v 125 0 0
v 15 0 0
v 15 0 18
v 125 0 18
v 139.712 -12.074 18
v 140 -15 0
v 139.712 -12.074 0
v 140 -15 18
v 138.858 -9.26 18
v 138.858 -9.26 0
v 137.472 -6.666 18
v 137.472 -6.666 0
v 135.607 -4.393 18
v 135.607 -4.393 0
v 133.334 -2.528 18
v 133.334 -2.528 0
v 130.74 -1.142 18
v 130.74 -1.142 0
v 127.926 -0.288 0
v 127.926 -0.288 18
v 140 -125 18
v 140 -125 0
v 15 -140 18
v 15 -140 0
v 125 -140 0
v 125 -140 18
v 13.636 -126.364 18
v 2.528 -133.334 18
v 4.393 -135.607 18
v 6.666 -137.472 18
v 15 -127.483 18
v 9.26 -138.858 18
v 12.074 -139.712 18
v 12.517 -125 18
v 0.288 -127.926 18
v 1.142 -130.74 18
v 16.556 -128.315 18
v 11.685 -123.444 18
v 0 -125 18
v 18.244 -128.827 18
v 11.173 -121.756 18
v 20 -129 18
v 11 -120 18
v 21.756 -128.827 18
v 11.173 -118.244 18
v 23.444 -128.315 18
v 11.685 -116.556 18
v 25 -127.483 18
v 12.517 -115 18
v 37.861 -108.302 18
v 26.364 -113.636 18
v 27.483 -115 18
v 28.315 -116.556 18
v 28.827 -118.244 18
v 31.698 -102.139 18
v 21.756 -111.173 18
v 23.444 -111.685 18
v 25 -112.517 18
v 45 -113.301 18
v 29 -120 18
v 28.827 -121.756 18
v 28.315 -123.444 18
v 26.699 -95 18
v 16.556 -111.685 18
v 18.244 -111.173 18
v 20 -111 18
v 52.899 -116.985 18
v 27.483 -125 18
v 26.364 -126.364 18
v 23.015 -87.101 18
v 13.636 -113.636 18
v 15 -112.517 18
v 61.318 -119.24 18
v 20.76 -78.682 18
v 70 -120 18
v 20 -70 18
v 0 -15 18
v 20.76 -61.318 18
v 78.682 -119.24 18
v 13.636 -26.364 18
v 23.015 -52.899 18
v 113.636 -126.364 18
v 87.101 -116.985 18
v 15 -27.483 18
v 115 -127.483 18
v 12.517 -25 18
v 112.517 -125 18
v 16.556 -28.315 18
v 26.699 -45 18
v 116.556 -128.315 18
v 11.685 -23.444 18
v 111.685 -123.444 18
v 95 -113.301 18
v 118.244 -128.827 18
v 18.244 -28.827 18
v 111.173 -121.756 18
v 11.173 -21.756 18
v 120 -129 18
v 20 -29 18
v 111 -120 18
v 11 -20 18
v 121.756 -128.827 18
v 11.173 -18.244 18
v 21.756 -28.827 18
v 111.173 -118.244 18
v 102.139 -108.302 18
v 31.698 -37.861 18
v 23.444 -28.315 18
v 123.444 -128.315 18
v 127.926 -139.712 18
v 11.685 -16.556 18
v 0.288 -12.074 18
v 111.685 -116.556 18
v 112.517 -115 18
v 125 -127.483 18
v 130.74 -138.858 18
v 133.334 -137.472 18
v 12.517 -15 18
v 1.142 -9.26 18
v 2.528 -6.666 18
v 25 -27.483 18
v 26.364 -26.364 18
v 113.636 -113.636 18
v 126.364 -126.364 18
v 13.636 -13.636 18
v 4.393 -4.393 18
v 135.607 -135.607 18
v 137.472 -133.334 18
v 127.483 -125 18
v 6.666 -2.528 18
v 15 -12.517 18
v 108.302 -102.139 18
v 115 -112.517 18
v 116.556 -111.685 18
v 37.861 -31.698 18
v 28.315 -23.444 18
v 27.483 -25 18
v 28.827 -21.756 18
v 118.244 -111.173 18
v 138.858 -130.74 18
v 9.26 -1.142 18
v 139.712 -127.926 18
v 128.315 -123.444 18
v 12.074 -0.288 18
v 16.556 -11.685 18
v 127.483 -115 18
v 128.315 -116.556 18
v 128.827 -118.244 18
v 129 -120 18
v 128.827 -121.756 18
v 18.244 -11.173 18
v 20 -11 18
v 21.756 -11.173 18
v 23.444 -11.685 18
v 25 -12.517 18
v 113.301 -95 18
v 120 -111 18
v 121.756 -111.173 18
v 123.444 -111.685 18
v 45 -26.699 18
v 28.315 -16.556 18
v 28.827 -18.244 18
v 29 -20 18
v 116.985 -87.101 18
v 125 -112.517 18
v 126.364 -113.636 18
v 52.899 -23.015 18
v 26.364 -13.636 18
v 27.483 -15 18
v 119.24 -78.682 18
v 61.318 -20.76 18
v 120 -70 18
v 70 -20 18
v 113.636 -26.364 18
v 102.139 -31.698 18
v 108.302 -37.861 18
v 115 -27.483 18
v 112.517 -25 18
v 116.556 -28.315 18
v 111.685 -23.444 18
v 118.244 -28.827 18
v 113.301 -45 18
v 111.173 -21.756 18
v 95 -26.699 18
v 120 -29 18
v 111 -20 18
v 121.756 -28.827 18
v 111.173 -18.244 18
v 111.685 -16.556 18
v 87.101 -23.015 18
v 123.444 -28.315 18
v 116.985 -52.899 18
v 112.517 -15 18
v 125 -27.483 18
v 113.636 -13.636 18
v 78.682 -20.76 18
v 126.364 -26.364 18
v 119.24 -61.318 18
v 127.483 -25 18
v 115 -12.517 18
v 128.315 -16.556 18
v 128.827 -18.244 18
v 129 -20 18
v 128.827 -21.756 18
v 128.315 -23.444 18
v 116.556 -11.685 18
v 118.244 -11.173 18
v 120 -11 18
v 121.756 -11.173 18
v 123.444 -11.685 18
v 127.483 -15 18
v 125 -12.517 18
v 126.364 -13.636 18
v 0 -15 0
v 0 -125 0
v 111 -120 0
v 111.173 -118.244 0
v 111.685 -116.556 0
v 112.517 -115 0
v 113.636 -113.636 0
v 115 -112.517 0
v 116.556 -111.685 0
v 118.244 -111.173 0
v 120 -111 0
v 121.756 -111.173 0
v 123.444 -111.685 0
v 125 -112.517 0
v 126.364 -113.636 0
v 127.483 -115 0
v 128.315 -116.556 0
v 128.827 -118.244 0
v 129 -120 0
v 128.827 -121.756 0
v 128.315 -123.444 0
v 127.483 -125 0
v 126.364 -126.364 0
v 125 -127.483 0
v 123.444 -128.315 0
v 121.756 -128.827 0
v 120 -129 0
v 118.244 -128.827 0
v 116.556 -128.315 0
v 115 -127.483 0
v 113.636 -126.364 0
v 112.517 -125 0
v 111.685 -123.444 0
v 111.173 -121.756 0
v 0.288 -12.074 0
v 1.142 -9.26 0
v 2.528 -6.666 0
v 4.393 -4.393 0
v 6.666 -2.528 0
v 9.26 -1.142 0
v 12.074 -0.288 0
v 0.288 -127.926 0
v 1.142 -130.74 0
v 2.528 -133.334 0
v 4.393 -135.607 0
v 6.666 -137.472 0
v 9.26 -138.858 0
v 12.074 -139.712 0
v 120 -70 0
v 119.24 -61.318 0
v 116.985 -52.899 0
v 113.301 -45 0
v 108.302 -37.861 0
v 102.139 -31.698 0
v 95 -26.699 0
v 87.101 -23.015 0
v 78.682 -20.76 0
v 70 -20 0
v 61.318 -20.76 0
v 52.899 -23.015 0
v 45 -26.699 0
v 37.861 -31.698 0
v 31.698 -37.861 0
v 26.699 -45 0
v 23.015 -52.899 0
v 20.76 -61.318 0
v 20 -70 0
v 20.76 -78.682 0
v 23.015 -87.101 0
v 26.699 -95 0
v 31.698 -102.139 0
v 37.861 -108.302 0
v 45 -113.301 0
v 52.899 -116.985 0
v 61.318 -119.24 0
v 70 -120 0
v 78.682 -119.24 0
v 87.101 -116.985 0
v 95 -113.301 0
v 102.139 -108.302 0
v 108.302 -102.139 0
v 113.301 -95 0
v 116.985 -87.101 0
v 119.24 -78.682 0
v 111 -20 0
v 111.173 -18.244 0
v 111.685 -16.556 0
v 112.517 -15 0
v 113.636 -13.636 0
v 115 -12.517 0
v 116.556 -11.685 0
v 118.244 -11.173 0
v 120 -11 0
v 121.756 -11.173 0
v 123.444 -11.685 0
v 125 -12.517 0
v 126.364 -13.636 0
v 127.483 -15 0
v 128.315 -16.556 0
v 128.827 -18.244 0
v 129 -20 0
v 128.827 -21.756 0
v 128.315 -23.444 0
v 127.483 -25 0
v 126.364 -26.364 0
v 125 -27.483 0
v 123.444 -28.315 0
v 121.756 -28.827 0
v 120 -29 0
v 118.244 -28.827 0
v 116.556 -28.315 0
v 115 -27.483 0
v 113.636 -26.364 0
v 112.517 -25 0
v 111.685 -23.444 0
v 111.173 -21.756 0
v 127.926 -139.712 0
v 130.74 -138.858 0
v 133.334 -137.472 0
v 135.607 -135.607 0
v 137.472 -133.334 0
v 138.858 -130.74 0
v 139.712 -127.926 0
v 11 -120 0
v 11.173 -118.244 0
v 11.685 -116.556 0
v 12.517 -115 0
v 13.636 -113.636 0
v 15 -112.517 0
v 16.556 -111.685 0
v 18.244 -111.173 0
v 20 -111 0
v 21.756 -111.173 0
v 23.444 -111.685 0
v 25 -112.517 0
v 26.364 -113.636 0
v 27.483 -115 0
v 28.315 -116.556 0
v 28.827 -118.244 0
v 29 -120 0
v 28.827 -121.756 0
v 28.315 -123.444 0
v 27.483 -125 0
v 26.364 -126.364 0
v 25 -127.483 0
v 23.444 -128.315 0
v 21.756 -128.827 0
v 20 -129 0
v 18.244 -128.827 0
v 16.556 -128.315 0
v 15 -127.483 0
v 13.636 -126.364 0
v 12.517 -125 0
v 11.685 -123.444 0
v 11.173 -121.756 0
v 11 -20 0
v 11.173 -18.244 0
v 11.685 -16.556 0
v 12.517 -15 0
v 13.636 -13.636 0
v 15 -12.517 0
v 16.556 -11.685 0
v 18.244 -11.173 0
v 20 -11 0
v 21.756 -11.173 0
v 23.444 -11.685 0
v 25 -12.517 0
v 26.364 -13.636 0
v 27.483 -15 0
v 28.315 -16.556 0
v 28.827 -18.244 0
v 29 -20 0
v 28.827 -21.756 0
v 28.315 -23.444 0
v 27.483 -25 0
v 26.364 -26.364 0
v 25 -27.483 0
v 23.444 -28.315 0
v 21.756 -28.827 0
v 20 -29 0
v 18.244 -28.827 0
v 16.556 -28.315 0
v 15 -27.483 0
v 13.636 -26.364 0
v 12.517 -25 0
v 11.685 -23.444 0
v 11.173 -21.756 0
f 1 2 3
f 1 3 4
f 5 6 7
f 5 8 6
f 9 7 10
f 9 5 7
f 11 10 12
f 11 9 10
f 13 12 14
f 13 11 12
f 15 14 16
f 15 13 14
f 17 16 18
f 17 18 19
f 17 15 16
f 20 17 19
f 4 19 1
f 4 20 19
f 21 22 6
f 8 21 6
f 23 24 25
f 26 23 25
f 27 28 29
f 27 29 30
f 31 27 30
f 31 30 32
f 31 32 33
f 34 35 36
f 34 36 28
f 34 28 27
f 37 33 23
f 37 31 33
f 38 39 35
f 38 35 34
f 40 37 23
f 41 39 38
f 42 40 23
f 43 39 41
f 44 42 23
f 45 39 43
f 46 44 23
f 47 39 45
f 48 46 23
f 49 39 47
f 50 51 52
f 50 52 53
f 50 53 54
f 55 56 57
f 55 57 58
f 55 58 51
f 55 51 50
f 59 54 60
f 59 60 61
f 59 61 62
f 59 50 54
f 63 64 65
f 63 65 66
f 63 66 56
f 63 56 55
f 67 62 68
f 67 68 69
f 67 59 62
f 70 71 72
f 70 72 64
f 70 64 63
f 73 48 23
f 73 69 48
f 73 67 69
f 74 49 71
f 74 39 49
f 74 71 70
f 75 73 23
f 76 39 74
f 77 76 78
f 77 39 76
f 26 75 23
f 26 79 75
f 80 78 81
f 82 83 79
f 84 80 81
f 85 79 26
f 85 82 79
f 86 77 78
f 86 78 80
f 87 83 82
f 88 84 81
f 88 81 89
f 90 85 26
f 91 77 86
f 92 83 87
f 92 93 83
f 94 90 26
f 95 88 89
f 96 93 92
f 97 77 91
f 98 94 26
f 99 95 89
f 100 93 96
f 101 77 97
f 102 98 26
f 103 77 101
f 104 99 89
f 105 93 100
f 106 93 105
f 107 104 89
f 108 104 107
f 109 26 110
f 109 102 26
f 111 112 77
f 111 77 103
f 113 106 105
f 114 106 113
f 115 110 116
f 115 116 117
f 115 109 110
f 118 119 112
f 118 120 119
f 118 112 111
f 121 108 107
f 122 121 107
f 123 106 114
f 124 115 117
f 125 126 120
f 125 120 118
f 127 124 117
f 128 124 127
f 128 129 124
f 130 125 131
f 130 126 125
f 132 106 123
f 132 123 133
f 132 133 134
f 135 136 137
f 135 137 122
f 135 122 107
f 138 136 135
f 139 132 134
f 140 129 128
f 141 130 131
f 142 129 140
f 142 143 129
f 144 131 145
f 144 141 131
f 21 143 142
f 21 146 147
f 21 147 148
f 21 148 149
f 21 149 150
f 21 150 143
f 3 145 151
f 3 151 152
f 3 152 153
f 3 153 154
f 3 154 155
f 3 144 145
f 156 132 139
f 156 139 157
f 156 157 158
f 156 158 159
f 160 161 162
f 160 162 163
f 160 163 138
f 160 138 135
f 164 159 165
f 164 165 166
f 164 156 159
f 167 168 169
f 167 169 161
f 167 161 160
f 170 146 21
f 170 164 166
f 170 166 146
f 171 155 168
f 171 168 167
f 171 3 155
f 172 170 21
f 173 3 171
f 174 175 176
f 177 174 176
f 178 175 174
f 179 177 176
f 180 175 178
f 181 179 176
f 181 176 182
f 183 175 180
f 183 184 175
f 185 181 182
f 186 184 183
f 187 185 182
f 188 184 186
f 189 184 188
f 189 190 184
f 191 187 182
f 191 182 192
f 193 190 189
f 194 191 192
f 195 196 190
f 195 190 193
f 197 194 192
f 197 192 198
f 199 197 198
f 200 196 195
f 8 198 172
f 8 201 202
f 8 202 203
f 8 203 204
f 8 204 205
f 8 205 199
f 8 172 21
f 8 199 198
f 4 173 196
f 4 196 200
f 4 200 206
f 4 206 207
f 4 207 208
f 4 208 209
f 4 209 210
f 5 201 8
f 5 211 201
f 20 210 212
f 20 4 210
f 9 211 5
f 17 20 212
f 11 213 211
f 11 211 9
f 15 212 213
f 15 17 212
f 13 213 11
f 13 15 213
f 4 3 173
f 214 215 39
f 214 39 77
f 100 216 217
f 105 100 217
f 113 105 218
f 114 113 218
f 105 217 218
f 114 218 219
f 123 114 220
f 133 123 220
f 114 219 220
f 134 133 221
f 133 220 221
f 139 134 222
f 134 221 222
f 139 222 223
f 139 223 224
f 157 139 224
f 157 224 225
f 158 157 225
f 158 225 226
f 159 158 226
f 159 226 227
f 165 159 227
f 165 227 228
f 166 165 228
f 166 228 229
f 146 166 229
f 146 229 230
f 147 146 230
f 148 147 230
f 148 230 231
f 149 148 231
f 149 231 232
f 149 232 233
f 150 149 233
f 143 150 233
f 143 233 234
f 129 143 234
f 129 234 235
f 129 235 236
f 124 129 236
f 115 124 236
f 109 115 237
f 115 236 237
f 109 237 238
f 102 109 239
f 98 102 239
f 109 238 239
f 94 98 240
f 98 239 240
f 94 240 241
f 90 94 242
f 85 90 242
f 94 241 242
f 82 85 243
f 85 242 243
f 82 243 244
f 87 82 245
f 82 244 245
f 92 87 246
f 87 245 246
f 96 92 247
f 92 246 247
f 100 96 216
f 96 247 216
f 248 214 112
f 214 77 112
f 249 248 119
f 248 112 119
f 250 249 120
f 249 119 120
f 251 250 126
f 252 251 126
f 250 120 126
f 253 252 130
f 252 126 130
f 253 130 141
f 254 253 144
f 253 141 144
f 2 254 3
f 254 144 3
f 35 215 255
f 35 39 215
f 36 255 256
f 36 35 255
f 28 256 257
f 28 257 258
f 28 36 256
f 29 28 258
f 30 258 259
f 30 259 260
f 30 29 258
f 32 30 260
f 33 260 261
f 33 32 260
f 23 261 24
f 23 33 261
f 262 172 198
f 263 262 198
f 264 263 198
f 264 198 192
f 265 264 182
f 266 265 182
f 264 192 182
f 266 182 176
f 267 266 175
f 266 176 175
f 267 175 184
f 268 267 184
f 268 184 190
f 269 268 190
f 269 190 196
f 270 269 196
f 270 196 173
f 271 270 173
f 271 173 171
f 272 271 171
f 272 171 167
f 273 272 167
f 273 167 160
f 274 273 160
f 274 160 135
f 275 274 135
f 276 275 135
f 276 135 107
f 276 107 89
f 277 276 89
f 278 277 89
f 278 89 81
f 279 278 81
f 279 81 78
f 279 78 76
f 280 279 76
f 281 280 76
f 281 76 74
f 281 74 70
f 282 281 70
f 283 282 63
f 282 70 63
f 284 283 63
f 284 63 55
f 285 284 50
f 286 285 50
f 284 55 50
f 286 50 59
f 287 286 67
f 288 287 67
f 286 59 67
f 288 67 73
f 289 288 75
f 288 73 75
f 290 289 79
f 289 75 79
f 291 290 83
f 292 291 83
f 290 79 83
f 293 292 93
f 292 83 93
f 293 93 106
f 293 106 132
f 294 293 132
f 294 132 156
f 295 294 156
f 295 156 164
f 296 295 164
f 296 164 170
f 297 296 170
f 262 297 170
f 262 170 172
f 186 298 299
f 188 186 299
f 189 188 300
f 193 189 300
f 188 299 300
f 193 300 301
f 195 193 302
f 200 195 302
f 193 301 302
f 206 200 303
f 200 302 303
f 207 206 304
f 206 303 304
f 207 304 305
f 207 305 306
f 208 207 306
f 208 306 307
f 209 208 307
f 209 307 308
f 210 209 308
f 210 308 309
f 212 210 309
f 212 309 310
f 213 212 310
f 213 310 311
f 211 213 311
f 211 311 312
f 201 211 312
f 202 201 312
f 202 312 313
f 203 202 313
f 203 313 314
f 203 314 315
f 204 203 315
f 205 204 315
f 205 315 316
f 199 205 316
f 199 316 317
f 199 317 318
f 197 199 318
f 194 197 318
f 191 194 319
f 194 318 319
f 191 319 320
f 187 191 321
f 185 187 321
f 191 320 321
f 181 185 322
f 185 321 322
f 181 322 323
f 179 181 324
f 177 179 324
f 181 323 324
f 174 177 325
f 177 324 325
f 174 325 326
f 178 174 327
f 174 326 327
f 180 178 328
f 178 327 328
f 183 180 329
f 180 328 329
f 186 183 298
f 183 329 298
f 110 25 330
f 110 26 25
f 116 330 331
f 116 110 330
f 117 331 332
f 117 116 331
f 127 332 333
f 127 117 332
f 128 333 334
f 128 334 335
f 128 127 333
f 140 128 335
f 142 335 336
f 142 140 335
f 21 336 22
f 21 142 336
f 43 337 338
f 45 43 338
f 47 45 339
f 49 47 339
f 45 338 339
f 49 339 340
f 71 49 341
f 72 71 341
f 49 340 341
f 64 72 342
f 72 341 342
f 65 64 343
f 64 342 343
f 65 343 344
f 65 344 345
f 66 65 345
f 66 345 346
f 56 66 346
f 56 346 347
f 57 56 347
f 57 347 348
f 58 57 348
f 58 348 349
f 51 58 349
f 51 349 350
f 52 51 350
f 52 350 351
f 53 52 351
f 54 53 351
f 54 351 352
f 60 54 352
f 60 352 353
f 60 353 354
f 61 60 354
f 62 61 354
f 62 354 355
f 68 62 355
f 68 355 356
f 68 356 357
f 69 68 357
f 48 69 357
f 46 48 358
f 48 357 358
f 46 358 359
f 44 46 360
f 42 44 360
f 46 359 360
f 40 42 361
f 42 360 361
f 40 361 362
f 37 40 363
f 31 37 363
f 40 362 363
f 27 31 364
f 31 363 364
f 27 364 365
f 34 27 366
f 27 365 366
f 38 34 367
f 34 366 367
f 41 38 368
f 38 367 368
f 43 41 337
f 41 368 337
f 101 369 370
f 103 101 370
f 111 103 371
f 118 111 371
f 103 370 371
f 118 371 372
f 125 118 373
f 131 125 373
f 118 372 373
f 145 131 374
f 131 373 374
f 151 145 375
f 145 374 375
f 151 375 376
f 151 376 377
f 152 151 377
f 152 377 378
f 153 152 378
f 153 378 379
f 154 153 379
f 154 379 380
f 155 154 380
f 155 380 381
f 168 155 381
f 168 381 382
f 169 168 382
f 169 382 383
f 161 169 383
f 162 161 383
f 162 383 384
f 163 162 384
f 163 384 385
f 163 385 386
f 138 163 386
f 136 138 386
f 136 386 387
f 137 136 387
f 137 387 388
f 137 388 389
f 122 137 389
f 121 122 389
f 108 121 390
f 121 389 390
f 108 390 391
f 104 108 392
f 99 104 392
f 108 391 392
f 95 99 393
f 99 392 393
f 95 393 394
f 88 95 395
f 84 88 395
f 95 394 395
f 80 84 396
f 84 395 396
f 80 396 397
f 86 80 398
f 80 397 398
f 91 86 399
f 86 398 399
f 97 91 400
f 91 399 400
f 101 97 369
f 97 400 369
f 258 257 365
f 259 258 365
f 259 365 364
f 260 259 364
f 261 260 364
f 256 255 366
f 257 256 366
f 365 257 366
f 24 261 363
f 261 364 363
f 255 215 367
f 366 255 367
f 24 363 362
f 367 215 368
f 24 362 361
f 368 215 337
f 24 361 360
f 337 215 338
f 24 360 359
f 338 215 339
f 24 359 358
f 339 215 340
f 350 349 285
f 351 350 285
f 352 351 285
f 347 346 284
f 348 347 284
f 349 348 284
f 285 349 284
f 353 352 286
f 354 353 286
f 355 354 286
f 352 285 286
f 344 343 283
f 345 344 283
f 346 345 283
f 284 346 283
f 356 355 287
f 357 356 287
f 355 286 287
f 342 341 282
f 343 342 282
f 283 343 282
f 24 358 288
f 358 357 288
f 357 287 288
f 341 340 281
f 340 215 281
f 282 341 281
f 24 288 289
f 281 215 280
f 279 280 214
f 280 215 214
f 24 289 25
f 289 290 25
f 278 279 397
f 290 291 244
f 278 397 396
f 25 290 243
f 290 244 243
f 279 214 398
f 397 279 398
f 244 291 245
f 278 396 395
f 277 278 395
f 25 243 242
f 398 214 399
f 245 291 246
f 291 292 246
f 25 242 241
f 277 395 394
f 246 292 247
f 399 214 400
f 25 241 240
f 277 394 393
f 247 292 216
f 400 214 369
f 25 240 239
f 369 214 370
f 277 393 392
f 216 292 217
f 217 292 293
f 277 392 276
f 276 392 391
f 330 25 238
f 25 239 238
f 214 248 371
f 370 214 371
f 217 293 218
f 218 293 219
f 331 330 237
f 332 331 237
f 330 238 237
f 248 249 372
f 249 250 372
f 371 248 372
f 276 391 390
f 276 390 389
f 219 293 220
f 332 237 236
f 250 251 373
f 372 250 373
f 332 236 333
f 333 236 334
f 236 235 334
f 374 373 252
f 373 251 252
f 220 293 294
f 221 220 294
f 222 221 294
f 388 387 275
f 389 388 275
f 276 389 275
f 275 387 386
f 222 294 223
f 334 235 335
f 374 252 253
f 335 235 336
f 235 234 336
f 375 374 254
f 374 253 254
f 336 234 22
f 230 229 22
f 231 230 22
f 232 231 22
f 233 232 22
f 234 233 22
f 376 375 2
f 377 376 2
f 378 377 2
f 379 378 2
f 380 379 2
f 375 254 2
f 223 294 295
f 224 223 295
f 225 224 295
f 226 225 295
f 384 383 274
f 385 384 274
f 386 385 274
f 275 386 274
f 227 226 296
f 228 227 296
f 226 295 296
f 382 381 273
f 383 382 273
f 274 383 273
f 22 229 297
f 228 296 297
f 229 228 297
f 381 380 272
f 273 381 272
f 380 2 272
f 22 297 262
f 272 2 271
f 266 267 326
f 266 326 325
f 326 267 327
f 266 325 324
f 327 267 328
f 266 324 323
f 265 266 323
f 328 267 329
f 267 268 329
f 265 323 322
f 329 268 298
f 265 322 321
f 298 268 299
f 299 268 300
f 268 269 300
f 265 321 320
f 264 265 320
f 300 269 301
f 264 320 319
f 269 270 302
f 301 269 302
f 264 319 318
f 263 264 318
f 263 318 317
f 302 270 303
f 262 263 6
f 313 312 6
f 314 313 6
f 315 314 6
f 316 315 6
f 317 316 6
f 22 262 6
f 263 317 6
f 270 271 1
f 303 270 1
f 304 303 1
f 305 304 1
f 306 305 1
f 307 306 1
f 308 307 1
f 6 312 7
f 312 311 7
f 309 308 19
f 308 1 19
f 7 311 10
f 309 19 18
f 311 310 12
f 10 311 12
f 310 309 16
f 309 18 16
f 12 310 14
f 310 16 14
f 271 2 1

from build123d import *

# Parameters (mm, degrees)
F0_W     = 140
F0_H     = 140
F1_DEPTH = 18
F2_R     = 15
F4_D     = 18
F5_R     = 50
F6_DEPTH = 18.001


with BuildPart() as f1:
    # F0 (on Top) → F1 (new body)
    with BuildSketch(Plane.XY):
        with Locations((70, -70)):
            Rectangle(F0_W, F0_H)
    extrude(amount=F1_DEPTH)

    # F2
    f2_edges = [f1.edges().sort_by_distance(p)[0] for p in [
        (0, -140, 9),
        (140, -140, 9),
        (140, 0, 9),
        (0, 0, 9),
    ]]
    fillet(f2_edges, radius=F2_R)

    # F4 (through all)
    with Locations(Plane.XY.offset(18)):
        with Locations((120, -120), (20, -120), (20, -20), (120, -20)):
            Hole(F4_D / 2)

    # F5 (on face) → F6 (cut, through all)
    with BuildSketch(Plane.XY.offset(18)):
        with Locations((70, -70)):
            Circle(F5_R)
    extrude(amount=-F6_DEPTH, mode=Mode.SUBTRACT)


solid = f1.part
